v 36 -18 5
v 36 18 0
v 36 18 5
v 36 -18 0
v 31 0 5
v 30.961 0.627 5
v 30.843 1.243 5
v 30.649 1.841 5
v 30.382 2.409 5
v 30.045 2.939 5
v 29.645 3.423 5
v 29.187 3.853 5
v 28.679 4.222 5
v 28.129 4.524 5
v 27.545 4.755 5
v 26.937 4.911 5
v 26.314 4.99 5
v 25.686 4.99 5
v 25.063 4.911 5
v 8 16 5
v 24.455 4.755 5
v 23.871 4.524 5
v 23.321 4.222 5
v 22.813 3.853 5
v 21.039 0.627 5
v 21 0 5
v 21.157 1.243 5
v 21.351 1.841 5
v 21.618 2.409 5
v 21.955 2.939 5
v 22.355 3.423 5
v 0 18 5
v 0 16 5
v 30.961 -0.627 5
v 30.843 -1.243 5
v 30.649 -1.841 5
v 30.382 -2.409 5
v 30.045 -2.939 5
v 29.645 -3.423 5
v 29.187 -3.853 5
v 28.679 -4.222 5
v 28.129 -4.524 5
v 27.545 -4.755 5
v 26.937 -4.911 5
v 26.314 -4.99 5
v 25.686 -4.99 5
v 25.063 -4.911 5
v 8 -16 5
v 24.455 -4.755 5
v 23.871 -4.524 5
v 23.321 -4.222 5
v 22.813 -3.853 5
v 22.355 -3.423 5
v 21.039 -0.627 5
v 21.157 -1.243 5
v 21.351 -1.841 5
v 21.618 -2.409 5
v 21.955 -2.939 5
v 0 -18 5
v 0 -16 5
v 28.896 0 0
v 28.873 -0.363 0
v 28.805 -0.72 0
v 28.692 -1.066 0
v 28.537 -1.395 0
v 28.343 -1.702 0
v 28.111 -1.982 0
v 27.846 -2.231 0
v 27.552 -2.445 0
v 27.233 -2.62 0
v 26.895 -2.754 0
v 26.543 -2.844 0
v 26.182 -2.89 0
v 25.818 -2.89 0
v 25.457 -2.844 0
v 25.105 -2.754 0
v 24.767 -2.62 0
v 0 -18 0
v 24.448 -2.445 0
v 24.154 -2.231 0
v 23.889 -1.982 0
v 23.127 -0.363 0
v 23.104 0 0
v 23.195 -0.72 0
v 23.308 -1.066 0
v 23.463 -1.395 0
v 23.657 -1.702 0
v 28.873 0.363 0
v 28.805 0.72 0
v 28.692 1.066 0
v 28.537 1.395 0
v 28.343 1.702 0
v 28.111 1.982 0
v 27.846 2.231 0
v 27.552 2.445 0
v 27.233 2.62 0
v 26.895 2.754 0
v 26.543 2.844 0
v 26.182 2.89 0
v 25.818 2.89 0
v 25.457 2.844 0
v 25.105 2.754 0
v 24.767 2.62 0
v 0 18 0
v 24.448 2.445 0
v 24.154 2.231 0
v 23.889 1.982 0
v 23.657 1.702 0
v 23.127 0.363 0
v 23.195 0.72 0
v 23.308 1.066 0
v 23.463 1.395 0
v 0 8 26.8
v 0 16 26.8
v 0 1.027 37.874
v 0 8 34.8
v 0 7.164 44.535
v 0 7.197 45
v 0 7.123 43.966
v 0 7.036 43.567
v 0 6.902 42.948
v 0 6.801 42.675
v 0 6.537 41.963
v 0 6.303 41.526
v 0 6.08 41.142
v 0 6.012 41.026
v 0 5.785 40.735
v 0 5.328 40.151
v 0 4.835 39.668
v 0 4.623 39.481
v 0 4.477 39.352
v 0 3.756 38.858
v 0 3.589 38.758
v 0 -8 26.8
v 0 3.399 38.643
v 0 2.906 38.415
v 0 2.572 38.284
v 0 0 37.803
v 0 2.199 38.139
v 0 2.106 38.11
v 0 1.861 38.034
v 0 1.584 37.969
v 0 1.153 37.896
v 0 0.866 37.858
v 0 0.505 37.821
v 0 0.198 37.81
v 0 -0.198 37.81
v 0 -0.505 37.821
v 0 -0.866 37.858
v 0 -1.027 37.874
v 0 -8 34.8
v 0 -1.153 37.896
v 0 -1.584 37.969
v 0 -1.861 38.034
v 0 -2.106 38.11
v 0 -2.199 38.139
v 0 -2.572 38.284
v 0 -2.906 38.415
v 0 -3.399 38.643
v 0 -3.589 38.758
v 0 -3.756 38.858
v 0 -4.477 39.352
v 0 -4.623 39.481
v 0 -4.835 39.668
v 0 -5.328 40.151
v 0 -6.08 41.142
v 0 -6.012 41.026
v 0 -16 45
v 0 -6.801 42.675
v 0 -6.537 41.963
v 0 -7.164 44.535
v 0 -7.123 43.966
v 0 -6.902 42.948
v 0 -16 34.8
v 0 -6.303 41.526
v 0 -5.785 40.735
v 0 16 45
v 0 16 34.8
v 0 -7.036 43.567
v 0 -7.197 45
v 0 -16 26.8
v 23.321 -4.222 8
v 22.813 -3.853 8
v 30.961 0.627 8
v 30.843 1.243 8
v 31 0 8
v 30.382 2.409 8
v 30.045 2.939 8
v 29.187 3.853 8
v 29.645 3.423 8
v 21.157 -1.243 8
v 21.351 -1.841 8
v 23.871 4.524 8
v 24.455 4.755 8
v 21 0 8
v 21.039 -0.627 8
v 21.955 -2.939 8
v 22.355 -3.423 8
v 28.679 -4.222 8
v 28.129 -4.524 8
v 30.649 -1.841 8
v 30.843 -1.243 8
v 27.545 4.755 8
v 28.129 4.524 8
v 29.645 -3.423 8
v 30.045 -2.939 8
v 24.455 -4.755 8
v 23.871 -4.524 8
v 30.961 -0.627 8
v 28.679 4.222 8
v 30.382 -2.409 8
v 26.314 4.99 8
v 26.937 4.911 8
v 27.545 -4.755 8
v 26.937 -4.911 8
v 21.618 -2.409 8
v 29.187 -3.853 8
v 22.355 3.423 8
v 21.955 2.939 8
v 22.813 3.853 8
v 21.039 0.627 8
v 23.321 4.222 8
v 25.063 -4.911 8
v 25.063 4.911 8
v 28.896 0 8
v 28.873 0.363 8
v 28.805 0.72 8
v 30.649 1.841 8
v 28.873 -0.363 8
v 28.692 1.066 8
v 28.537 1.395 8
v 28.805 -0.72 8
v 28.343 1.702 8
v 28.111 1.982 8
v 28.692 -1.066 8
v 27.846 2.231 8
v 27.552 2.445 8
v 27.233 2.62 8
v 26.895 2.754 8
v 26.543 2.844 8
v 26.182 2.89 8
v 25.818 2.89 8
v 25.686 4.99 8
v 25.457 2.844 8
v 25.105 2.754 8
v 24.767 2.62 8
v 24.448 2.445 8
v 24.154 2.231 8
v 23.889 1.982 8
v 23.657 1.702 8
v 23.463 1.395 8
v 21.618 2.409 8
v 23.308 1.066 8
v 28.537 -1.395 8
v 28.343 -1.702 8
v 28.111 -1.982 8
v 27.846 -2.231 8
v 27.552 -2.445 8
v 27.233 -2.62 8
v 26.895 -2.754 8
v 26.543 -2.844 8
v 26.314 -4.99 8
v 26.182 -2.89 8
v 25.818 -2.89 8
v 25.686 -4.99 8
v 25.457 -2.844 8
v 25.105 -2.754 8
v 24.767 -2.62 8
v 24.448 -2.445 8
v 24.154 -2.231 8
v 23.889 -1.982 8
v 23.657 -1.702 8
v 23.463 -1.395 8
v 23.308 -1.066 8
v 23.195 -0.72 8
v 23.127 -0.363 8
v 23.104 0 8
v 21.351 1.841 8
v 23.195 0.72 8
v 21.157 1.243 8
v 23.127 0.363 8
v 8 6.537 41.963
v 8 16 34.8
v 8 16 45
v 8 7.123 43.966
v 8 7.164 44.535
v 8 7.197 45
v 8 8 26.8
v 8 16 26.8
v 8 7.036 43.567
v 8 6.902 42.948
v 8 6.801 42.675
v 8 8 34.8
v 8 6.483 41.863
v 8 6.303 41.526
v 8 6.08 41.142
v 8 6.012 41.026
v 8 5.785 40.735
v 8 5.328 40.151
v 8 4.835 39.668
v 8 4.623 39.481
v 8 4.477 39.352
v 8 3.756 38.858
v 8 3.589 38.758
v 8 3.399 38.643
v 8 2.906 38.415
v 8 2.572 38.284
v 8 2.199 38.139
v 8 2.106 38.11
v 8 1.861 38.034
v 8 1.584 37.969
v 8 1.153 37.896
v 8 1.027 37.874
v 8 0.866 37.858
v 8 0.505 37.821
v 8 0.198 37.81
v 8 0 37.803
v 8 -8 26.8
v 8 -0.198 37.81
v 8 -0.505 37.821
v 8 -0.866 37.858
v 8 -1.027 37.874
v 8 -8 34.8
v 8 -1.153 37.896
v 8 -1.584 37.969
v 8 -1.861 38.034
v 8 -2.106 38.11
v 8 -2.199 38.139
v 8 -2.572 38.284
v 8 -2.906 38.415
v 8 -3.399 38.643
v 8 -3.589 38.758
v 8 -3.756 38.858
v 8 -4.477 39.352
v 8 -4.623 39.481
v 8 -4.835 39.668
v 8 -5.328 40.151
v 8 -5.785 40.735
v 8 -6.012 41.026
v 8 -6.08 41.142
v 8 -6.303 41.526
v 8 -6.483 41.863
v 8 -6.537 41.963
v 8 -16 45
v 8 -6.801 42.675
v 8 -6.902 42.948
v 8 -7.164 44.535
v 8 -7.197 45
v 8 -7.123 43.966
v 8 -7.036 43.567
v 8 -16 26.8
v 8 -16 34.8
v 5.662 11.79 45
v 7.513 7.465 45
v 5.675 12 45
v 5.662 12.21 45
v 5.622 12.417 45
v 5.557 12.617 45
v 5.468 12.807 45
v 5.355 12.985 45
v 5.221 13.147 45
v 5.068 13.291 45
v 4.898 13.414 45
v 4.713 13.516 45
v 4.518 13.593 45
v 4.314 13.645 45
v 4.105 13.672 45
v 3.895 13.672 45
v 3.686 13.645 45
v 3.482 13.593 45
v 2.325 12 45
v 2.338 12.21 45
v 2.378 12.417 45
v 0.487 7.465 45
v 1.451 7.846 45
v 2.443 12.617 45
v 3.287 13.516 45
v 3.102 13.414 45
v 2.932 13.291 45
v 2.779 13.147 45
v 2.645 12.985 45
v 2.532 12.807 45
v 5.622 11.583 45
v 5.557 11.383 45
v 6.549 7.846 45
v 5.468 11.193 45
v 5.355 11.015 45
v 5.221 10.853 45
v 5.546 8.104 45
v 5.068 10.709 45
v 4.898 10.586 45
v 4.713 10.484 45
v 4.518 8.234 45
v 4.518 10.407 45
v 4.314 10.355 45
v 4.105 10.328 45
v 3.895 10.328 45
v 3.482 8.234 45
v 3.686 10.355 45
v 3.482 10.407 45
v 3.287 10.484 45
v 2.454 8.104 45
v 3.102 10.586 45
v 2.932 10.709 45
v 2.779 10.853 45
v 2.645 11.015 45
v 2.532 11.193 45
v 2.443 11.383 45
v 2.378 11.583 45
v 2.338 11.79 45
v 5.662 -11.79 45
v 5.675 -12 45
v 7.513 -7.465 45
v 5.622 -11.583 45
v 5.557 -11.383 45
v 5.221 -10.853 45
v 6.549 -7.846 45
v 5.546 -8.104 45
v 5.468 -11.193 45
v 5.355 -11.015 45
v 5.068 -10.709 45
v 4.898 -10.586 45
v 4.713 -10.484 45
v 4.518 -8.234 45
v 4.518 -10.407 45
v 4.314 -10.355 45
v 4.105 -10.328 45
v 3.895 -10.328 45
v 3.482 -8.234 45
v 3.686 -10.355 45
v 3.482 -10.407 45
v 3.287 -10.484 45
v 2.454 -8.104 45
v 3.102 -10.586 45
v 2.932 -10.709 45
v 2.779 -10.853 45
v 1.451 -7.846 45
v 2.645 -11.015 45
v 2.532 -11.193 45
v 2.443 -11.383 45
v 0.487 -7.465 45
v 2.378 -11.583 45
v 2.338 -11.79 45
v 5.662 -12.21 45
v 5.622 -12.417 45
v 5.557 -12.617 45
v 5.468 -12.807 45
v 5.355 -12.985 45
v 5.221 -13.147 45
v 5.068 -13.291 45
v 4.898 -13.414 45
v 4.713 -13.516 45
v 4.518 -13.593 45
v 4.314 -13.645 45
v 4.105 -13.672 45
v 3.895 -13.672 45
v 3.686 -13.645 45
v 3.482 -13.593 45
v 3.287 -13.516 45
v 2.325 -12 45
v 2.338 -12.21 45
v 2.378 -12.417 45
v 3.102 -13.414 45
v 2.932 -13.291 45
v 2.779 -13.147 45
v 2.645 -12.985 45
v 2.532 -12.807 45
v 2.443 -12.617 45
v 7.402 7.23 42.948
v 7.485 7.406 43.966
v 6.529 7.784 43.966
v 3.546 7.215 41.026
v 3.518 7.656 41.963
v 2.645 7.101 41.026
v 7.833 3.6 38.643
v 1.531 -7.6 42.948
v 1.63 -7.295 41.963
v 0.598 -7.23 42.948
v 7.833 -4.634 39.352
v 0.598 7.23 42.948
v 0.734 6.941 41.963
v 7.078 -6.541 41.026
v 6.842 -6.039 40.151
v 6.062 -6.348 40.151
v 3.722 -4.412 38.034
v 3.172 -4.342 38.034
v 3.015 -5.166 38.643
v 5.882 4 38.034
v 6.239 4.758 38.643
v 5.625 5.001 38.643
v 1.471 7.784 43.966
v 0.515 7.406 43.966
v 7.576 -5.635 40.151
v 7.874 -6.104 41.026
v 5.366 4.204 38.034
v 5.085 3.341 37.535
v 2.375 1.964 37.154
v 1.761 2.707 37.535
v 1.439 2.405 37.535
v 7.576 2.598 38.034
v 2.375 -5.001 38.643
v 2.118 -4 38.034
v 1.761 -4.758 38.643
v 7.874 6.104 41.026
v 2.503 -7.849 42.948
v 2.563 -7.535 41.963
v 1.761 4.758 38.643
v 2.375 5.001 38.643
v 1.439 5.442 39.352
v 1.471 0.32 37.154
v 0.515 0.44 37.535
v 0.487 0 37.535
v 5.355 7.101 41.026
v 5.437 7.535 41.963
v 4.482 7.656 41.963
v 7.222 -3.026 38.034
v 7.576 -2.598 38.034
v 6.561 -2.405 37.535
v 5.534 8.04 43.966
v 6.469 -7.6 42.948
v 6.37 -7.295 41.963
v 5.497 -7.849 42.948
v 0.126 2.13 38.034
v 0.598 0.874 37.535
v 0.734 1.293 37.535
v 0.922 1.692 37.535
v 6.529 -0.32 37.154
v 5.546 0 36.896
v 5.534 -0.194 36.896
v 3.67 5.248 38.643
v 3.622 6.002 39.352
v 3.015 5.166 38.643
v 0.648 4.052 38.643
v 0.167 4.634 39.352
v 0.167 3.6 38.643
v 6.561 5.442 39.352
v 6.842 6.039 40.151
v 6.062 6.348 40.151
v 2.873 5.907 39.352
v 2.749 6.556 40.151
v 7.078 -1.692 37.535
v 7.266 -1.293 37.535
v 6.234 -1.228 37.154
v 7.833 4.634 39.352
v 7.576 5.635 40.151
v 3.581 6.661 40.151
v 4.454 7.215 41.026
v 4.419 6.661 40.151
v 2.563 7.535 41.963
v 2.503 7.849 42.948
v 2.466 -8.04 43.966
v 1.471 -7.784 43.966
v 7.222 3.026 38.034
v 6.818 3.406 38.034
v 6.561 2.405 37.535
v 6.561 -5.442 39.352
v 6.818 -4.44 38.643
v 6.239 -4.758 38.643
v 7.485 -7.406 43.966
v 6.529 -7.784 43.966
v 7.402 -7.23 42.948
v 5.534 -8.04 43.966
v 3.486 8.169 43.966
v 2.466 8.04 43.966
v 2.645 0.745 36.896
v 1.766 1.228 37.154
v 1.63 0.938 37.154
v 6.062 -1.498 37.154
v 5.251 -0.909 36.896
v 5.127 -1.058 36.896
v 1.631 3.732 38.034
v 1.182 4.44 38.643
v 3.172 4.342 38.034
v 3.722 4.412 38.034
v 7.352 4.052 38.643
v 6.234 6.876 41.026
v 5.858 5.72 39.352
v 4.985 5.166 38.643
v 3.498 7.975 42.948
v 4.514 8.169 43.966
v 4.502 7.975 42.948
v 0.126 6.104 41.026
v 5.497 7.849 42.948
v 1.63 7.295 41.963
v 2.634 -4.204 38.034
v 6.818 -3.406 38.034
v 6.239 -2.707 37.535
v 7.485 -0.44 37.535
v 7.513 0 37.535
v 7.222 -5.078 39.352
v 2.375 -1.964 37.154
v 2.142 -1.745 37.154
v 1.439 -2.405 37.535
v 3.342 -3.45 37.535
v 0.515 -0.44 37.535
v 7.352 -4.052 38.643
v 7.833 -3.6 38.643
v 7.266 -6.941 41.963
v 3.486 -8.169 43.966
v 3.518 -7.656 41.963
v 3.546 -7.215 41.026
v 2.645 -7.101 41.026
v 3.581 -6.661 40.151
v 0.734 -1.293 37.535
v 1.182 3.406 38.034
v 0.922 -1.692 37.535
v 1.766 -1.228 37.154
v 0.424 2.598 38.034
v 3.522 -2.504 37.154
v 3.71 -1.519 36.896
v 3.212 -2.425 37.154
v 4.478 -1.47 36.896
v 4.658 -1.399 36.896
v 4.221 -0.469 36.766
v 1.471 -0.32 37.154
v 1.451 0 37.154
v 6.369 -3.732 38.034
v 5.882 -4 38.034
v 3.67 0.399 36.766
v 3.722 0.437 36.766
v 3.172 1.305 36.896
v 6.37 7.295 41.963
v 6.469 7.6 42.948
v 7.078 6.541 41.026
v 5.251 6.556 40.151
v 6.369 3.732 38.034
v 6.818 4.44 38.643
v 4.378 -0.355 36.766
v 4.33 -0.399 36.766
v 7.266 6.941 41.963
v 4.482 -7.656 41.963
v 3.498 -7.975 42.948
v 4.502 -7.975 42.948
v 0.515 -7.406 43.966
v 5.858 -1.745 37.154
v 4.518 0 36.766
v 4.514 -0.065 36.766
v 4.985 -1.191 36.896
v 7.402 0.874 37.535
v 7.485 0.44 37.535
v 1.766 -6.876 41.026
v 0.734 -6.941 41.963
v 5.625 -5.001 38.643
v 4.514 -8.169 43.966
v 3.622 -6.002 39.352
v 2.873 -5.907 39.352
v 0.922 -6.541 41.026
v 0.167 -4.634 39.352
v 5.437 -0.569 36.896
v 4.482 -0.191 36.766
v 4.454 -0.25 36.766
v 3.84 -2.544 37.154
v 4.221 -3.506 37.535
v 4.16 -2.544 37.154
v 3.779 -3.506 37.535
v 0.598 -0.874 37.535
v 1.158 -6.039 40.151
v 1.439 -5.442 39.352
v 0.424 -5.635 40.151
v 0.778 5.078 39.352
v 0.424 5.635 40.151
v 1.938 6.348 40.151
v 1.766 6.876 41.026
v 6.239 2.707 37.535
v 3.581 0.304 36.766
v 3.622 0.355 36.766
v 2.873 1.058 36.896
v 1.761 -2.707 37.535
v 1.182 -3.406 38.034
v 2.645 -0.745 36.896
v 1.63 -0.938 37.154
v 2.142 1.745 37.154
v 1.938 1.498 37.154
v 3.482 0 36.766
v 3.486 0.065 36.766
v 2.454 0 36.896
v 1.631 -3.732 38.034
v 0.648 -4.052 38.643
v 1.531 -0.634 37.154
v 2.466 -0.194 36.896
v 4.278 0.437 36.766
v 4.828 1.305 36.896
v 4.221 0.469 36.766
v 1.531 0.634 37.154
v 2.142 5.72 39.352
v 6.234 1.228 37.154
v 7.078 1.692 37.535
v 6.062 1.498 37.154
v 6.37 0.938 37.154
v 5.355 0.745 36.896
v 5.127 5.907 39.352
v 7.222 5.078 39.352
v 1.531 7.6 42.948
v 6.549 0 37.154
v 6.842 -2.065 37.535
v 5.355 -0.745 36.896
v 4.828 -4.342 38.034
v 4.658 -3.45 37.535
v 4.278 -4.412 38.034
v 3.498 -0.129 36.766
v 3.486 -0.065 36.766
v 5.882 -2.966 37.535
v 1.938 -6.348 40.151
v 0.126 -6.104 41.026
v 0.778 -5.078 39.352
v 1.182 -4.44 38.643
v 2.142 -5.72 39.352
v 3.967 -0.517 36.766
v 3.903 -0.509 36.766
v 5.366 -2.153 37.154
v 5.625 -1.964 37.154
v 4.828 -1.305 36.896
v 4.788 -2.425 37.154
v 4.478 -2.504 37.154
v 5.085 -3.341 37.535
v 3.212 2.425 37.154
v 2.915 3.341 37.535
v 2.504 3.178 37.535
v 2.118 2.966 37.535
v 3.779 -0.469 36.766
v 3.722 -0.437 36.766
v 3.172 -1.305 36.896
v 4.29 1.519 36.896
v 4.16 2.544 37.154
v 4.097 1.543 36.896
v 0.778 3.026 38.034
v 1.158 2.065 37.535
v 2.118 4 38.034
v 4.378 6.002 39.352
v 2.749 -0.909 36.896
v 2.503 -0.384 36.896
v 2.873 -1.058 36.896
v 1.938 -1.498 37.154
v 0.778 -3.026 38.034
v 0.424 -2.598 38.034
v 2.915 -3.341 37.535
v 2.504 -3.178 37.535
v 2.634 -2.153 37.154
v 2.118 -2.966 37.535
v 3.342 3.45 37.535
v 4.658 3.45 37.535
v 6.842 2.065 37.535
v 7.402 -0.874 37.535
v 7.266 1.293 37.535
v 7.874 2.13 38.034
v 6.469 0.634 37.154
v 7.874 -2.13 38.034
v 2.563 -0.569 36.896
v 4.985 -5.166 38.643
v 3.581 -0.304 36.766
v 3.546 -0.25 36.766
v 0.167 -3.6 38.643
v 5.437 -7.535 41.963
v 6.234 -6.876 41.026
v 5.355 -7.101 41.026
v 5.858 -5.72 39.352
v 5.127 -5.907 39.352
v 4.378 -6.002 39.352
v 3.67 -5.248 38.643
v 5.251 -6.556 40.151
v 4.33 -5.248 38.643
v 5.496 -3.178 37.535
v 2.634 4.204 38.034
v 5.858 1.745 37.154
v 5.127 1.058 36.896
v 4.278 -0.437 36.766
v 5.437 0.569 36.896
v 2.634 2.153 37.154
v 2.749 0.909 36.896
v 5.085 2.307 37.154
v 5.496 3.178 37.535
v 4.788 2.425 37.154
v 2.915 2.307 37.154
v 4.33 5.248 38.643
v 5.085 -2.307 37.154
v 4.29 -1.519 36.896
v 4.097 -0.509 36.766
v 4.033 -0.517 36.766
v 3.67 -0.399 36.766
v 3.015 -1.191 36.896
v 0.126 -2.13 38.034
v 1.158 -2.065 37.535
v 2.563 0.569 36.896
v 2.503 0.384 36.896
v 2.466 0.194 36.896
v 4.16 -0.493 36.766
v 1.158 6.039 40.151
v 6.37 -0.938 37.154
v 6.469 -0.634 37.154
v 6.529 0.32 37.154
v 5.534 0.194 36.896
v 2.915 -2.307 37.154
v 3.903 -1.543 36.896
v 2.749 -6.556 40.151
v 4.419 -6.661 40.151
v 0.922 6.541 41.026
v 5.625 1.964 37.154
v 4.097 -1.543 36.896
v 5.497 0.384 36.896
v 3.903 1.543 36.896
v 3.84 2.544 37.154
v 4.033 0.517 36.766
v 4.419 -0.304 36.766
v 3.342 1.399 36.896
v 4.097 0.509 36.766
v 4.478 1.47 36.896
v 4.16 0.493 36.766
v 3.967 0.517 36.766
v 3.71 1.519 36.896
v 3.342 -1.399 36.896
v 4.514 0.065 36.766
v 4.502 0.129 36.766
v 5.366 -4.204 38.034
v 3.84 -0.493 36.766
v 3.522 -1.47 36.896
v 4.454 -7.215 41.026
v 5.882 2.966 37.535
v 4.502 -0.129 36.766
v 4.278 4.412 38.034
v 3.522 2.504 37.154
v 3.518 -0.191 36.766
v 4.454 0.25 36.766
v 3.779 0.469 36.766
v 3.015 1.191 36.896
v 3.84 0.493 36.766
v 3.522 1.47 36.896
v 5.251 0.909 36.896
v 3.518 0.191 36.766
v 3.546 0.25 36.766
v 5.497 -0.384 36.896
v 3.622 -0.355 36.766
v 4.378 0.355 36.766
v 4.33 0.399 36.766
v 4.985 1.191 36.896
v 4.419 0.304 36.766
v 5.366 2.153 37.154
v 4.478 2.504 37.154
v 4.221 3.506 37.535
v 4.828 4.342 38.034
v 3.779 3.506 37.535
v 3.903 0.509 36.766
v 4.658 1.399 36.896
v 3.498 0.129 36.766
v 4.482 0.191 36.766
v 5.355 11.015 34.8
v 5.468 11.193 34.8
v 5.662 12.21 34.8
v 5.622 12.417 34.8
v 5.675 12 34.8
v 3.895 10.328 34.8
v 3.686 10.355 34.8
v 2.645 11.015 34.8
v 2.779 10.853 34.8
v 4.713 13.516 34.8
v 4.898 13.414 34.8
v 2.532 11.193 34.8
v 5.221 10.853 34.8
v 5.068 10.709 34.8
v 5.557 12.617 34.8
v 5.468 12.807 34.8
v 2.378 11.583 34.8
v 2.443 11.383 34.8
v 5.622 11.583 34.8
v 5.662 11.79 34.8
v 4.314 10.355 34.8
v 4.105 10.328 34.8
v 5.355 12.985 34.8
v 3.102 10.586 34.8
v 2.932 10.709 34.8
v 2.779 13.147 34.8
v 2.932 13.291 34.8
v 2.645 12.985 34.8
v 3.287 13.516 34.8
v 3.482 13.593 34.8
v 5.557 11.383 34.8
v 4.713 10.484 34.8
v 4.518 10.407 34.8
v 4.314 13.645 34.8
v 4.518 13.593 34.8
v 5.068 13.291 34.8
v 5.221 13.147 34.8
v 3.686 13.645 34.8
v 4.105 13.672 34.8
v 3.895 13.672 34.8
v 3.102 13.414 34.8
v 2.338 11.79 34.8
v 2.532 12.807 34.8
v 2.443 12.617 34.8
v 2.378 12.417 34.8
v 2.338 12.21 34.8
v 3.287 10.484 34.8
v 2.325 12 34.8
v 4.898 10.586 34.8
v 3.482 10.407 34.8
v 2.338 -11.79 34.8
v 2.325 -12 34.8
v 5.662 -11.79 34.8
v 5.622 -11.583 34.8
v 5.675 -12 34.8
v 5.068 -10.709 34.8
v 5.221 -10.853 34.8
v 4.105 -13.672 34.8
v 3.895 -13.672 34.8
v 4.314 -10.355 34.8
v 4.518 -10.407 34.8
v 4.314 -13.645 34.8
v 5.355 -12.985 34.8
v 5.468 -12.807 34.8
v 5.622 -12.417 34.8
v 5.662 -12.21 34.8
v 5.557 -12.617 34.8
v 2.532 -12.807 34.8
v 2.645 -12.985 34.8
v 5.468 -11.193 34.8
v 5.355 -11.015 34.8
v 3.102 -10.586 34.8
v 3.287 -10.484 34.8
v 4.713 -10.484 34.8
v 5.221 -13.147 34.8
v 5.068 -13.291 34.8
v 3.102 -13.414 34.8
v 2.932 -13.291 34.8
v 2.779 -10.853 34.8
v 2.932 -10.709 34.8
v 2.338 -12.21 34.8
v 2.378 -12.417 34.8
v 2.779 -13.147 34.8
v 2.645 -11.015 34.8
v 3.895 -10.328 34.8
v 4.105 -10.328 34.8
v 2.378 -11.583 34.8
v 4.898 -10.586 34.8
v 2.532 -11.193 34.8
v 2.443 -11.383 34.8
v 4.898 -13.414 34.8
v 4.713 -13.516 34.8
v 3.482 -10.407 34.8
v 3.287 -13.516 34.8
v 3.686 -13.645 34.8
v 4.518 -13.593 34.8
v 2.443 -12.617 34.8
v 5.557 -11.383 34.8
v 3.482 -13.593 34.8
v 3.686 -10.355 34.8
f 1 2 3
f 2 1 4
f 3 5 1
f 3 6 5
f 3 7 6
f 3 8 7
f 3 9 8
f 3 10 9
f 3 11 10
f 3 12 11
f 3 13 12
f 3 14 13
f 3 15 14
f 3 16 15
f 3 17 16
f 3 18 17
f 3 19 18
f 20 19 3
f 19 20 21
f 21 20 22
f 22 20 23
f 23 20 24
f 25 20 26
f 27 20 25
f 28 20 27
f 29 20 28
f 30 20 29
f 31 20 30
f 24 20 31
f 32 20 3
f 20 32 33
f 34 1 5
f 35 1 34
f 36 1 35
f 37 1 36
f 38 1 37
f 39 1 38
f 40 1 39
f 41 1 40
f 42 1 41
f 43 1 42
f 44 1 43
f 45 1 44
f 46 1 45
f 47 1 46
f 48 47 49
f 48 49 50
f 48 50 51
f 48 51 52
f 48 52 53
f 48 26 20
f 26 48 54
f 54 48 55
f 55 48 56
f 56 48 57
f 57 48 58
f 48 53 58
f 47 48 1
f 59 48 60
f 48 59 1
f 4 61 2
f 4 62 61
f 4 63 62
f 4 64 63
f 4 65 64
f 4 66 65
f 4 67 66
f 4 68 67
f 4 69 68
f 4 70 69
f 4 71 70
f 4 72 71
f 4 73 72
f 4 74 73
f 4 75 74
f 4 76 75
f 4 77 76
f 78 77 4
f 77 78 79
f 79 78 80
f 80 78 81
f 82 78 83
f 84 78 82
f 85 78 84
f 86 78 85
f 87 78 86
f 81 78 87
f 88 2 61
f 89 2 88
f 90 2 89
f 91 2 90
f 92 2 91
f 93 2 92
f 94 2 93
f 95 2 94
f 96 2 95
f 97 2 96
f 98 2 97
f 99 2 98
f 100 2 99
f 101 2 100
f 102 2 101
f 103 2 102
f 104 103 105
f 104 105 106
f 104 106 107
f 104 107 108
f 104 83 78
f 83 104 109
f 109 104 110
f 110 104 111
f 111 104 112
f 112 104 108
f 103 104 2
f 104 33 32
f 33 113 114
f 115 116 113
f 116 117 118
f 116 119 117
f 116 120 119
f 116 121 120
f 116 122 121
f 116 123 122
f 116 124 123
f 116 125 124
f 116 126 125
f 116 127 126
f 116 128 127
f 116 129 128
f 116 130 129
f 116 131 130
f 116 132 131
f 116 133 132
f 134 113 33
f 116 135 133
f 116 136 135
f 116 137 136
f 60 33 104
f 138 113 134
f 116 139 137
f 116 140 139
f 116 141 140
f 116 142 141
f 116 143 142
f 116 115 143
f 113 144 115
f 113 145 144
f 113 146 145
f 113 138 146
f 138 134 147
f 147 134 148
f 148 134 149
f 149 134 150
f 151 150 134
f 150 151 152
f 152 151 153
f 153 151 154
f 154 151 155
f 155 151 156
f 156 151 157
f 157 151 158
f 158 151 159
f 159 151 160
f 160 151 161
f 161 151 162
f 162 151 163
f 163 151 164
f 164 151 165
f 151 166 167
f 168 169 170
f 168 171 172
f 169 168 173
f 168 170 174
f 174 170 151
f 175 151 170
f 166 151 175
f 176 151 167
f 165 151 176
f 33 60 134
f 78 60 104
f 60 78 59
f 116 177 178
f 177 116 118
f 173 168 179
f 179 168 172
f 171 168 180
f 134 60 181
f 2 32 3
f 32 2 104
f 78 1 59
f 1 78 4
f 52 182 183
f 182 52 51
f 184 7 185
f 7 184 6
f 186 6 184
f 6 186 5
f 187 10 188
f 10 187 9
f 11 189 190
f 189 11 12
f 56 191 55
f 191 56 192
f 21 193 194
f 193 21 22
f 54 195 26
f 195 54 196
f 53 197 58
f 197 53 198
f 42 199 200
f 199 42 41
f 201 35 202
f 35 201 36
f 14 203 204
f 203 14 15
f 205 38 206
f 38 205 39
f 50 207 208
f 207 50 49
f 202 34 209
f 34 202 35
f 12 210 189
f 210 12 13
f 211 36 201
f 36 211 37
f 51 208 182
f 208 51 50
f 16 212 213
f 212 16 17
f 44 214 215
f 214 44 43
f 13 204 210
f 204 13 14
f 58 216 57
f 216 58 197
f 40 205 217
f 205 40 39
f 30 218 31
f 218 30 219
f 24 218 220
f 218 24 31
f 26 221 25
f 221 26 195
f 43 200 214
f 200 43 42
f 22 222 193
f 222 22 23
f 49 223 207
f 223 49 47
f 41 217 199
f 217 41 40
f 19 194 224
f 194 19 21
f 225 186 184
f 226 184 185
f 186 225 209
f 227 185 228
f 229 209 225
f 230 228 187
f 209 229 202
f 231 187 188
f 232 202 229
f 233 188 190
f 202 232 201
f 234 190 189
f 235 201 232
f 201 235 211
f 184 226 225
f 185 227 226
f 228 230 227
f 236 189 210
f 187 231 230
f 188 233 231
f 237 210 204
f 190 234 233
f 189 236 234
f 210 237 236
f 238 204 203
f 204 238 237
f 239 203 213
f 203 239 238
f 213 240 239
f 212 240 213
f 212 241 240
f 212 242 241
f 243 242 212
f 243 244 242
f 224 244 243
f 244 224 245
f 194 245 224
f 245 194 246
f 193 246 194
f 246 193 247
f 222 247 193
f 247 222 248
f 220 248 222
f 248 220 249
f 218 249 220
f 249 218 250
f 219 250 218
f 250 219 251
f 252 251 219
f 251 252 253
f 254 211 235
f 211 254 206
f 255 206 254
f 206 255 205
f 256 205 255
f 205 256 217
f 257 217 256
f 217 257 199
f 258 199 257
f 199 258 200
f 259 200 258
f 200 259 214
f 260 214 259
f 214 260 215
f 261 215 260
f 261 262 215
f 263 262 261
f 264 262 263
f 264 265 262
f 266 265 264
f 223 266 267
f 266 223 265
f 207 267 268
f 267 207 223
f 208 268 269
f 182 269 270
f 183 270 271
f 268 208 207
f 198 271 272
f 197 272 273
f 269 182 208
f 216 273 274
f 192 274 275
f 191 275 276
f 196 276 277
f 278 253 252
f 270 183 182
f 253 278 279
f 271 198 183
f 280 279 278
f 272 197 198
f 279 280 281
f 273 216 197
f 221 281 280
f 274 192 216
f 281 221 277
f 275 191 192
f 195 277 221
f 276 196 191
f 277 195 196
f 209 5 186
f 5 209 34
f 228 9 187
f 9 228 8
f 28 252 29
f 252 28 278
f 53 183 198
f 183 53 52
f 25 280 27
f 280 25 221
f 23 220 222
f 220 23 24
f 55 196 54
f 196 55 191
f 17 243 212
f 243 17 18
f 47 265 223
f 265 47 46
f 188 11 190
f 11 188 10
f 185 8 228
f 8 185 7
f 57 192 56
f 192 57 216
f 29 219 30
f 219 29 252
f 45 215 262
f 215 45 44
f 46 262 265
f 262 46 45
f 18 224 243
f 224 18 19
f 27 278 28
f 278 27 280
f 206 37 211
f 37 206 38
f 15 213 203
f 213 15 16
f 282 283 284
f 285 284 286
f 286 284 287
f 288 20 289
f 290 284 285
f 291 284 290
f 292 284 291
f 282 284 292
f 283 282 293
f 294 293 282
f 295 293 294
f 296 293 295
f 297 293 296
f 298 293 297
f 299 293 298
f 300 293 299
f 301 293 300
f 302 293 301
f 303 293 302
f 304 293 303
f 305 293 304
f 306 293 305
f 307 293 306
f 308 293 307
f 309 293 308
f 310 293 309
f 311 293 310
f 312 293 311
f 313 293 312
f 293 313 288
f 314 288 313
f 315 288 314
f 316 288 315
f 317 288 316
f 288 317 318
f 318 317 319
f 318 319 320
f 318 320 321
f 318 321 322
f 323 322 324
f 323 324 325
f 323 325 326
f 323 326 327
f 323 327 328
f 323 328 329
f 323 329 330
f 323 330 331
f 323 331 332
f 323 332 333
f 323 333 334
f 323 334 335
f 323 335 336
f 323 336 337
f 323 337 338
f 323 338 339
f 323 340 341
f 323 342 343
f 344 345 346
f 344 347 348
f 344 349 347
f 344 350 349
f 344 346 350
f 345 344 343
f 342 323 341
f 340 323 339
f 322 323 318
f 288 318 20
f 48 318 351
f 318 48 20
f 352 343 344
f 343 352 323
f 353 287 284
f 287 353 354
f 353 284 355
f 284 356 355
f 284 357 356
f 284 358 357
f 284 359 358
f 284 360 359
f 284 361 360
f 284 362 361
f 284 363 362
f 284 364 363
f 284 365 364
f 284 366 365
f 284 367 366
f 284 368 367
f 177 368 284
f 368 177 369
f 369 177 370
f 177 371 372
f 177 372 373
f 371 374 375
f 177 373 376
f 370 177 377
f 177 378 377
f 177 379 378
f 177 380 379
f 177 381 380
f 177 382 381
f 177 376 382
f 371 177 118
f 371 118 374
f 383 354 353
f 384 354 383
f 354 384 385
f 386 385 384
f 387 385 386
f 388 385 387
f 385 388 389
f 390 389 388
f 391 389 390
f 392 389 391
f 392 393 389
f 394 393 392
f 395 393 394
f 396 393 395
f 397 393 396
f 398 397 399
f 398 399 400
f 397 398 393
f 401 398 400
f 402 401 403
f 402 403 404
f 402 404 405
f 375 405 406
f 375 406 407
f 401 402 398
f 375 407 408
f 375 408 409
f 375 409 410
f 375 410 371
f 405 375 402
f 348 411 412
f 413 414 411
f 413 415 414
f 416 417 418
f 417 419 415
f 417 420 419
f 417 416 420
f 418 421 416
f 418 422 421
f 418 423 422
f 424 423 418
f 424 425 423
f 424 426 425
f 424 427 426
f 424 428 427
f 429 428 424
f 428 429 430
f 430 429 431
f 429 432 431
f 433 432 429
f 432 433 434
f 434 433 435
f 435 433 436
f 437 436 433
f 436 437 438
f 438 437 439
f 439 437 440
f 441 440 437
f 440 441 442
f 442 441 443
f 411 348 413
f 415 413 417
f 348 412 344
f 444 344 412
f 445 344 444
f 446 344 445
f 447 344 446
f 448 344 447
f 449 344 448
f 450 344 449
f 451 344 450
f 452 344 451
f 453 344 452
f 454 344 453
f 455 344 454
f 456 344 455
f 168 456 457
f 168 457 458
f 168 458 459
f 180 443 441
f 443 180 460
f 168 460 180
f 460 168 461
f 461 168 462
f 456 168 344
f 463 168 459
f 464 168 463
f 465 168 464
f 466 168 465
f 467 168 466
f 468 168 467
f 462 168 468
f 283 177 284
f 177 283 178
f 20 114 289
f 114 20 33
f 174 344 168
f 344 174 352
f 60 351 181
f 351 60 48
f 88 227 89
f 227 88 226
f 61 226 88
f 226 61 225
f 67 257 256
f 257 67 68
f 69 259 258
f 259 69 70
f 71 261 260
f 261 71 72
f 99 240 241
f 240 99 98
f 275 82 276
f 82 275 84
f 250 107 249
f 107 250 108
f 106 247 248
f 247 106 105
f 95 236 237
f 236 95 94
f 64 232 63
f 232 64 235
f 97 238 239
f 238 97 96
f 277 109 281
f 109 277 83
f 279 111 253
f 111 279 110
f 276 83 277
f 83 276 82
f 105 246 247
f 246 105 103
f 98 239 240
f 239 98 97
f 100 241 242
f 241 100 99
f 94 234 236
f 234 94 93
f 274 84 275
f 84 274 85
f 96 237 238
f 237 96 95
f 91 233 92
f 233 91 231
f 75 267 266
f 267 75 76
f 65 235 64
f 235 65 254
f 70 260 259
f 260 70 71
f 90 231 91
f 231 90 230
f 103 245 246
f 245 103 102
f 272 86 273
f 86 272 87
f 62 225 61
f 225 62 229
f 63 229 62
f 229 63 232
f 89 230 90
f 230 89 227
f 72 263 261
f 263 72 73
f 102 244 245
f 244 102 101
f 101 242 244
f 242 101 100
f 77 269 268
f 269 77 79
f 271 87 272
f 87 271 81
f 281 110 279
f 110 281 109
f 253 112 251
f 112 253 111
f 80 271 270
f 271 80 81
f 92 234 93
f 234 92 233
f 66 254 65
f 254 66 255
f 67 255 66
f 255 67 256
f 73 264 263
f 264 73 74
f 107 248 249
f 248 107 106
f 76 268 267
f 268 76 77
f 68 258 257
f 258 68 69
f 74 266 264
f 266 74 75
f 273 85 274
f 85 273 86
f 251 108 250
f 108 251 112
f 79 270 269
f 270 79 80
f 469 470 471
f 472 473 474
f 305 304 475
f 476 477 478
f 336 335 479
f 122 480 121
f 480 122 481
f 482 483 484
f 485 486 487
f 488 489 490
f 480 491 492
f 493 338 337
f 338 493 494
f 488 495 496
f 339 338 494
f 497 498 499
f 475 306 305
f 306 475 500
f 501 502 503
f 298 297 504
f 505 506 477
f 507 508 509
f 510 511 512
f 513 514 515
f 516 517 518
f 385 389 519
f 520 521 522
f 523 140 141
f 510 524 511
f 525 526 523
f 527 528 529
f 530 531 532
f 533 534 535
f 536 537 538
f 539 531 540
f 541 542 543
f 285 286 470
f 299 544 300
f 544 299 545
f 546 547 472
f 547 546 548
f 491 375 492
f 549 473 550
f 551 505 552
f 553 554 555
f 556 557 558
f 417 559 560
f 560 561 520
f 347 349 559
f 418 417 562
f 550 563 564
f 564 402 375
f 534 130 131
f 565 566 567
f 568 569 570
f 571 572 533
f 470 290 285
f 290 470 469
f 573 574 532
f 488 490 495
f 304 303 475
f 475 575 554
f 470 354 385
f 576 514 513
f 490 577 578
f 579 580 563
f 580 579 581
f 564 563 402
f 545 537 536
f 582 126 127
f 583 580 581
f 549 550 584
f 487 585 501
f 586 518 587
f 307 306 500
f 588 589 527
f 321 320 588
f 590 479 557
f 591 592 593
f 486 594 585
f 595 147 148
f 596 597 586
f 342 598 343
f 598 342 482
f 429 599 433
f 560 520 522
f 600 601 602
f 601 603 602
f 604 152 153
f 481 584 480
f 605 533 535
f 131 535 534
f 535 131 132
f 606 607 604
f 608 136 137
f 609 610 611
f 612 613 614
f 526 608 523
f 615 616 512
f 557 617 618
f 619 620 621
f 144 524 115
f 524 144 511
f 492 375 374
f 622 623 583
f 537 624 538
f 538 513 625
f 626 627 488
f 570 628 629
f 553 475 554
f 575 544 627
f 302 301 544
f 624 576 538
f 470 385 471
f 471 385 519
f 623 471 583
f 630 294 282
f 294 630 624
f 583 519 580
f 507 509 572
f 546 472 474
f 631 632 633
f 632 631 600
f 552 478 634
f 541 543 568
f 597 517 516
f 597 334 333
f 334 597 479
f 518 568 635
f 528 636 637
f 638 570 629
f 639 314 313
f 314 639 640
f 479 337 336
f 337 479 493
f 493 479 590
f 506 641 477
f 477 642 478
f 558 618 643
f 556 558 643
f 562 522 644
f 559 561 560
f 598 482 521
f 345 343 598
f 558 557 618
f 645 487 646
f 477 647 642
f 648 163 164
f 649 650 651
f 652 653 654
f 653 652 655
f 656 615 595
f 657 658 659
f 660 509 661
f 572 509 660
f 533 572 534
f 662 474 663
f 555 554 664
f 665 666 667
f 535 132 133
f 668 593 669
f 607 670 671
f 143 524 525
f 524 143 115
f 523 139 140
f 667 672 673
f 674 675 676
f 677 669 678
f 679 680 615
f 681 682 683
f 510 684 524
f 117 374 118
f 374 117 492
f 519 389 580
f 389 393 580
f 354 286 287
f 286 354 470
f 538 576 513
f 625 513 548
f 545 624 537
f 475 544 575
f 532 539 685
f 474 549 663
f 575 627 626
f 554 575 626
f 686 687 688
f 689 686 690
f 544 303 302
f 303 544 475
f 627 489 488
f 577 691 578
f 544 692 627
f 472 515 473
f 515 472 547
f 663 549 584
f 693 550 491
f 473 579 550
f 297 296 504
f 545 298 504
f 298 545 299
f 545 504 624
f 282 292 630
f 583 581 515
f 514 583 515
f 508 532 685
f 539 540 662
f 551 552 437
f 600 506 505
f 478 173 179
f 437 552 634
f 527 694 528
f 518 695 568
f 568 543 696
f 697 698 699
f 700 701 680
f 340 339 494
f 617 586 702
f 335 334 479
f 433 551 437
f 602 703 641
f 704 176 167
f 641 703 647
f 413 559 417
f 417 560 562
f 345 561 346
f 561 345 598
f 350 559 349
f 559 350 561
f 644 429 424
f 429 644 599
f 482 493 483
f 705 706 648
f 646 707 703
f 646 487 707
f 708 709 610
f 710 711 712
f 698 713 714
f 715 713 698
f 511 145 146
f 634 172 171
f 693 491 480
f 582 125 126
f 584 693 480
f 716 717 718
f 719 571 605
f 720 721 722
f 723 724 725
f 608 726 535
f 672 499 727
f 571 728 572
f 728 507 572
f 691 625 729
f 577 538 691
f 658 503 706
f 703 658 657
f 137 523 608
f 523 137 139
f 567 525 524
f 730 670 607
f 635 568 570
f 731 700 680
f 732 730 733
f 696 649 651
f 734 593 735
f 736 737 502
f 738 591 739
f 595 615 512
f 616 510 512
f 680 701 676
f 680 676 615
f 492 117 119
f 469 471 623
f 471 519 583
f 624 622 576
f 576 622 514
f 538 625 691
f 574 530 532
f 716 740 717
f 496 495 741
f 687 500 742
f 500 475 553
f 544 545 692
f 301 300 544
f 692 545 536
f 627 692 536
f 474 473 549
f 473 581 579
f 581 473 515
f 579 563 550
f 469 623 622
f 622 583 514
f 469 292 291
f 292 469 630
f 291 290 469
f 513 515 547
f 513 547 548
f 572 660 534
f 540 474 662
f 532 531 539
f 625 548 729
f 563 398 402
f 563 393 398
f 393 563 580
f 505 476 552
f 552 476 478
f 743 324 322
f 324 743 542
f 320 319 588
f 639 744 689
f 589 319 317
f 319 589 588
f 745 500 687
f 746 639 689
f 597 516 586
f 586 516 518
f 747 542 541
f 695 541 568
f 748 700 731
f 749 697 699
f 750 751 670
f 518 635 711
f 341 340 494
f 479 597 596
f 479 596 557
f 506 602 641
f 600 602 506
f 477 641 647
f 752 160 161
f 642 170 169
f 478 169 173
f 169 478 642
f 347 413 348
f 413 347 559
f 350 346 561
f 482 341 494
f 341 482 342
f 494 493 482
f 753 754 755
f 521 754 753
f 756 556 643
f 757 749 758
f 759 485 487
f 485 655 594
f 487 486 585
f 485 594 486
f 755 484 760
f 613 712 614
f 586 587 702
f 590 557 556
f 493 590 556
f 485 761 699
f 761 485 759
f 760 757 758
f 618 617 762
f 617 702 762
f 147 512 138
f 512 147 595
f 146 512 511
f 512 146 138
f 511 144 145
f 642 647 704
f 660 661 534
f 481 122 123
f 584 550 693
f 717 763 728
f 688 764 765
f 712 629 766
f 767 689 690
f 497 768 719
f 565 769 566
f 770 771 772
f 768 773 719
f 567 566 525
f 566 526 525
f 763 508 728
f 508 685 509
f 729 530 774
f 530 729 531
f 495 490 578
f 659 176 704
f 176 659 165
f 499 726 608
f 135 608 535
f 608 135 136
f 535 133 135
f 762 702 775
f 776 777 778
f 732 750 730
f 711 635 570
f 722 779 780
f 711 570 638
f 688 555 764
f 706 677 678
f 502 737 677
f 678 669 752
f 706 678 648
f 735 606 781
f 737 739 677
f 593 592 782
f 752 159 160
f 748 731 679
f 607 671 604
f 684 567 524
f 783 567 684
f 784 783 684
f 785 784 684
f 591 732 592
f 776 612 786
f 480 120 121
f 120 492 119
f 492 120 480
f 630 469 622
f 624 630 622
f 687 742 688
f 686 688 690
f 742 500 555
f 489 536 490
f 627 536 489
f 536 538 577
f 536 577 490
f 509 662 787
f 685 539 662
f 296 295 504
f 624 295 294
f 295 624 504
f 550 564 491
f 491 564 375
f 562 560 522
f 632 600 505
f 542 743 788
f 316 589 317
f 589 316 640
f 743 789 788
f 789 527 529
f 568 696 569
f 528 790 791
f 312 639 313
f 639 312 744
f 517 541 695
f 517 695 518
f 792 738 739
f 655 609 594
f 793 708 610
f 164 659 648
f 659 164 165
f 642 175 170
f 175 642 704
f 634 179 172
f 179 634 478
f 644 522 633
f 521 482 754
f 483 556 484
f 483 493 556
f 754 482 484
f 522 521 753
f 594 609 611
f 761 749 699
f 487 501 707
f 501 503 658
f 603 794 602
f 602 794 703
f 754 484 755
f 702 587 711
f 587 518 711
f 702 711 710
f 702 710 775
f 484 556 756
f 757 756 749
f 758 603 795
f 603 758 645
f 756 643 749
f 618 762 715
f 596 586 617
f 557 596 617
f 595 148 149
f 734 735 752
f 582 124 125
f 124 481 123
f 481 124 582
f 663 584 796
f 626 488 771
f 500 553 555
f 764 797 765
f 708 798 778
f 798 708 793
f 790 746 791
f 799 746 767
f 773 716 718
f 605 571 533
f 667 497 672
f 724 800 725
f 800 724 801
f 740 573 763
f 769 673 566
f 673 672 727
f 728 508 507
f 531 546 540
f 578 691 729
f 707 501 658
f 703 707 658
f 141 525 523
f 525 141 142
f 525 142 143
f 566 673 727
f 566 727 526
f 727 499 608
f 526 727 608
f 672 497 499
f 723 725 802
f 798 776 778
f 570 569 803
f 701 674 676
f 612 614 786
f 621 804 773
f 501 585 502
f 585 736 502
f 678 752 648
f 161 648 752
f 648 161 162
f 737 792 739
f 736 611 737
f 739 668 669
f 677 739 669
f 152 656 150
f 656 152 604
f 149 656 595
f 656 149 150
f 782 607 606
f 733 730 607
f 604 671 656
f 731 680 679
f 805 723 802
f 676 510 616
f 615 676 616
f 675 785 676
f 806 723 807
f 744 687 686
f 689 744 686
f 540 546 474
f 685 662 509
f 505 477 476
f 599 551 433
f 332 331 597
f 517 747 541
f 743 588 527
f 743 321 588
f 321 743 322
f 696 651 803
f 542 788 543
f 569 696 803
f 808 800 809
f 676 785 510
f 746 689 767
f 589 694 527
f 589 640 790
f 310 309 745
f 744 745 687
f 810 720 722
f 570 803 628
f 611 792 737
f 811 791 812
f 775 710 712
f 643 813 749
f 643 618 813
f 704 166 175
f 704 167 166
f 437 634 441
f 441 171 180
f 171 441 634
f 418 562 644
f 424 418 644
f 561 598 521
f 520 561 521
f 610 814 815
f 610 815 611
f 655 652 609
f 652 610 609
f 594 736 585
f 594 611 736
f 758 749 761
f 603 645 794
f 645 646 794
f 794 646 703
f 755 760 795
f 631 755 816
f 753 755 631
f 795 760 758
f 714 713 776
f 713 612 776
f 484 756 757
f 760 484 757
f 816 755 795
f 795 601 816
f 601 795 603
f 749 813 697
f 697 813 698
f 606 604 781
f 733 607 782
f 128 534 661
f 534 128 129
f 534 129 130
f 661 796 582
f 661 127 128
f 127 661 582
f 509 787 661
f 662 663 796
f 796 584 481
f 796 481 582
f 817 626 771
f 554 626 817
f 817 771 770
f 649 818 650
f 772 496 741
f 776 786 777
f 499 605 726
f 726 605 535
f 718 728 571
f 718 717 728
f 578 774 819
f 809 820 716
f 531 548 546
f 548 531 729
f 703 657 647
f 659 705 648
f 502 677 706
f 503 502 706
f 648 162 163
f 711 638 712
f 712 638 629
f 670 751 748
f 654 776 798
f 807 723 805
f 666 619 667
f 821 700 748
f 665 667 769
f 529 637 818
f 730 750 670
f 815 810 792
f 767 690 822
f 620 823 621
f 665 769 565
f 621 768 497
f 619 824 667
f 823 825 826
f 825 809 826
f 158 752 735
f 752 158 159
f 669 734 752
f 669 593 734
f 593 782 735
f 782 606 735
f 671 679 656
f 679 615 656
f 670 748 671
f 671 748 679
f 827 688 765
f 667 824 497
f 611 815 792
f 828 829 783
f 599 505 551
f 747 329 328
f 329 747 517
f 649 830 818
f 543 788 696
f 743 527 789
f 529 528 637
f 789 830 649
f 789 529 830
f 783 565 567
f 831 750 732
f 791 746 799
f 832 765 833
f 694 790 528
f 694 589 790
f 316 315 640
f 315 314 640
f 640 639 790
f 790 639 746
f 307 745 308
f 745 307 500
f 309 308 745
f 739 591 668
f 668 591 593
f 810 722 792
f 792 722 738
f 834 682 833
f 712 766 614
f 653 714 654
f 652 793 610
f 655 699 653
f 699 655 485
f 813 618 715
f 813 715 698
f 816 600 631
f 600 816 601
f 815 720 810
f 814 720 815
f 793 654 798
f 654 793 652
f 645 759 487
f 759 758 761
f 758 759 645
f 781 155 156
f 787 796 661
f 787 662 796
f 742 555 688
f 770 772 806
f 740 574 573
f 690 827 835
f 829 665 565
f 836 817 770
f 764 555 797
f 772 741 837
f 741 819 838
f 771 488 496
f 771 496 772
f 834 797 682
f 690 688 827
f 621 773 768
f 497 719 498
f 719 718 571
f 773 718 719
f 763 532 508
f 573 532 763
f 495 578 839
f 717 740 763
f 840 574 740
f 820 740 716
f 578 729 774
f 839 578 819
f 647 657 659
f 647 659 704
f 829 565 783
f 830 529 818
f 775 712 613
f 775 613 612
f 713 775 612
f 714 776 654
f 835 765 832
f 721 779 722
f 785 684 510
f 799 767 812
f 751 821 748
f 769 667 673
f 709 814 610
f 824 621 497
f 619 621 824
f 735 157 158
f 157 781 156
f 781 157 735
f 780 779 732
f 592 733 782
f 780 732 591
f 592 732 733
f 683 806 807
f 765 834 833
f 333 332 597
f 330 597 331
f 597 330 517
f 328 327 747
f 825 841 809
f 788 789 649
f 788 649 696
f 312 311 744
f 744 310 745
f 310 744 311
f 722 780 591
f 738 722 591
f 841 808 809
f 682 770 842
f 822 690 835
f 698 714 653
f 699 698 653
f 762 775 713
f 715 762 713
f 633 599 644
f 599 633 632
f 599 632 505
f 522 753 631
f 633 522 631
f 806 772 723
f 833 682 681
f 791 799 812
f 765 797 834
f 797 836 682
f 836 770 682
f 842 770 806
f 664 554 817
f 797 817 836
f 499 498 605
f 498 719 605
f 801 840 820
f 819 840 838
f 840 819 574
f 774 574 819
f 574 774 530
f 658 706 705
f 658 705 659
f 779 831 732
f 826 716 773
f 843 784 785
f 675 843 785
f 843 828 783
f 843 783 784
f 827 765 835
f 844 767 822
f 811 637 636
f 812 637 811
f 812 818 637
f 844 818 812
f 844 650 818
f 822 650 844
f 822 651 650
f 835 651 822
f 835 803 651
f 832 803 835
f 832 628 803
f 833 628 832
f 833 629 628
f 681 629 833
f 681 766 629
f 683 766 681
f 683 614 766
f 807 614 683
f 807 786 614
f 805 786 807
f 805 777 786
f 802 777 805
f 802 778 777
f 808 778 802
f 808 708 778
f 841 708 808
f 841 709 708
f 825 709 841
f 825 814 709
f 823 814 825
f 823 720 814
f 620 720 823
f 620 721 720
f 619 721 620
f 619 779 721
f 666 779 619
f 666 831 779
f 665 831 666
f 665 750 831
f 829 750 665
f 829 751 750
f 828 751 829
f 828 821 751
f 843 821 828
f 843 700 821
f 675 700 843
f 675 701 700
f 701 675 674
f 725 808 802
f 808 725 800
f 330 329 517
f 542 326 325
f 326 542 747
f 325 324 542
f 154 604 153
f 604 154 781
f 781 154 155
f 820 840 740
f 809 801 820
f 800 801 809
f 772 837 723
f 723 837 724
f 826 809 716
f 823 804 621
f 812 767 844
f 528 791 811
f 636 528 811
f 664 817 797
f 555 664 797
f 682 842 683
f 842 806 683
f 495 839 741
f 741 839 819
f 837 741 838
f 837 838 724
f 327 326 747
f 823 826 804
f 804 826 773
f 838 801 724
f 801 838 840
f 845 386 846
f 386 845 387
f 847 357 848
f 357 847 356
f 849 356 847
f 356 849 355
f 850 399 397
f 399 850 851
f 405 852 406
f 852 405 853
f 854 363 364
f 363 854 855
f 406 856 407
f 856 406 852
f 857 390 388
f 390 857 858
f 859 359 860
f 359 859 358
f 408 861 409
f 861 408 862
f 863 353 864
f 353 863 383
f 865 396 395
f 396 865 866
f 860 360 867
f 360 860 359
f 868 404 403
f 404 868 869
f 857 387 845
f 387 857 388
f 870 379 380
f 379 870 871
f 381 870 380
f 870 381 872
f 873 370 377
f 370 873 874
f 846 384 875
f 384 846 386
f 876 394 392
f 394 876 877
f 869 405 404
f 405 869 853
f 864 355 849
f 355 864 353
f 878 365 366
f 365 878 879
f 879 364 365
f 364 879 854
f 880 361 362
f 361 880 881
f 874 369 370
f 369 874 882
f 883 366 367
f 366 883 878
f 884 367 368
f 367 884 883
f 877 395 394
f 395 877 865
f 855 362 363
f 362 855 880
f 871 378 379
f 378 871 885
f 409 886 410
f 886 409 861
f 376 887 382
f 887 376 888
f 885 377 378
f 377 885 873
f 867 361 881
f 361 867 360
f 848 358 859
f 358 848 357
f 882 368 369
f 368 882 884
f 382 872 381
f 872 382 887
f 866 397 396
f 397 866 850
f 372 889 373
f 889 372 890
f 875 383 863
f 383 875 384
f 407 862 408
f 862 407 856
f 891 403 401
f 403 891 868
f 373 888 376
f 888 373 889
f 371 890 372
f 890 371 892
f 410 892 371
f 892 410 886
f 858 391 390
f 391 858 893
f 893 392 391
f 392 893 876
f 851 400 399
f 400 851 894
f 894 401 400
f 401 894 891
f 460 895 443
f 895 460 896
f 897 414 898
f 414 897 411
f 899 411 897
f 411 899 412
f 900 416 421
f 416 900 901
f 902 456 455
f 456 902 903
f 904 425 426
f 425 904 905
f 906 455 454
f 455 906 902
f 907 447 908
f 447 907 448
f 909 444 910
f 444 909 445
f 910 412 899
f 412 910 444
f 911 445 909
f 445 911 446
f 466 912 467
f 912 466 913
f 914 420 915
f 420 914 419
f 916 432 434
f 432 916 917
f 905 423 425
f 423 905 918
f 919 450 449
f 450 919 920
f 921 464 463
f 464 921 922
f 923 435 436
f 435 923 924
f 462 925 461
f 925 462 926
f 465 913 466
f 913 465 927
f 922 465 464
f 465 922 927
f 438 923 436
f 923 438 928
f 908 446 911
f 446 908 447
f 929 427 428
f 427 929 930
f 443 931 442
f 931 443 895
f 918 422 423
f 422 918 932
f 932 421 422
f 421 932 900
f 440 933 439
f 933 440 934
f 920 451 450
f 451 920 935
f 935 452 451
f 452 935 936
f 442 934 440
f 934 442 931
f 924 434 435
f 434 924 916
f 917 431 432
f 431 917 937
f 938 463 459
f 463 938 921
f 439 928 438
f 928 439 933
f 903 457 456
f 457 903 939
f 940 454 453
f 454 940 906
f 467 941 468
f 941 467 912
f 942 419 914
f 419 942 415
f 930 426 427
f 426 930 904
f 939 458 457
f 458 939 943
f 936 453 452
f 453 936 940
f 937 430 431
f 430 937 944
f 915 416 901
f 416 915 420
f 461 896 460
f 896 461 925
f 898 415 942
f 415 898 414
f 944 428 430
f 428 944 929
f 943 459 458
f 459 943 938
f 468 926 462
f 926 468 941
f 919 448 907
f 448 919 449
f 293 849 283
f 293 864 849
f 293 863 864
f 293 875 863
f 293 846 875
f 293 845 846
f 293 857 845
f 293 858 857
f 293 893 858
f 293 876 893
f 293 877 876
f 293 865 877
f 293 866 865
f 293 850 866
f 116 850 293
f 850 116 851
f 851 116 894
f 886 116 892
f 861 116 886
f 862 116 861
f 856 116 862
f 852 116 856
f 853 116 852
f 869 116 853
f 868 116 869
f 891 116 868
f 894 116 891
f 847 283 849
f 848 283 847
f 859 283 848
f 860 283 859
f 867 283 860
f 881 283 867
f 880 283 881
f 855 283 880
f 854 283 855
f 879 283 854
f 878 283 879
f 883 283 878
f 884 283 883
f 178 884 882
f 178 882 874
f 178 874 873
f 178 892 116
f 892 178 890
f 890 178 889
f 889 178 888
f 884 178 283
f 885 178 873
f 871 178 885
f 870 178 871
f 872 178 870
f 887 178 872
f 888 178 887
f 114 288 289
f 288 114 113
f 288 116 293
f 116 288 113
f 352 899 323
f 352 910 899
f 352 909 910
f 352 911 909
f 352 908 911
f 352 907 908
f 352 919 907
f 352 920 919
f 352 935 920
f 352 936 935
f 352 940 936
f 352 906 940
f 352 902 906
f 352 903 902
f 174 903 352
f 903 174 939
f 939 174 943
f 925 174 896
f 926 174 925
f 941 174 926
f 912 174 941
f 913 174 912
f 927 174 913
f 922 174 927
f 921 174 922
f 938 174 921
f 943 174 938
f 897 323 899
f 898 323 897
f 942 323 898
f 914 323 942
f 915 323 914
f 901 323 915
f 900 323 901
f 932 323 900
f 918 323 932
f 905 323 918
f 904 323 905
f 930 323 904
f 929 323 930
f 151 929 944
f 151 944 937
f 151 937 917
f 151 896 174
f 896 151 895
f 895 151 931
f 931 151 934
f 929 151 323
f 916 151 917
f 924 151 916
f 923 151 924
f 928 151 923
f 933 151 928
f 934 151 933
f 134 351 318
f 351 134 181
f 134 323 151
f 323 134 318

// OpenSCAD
// base plate
// 20211206 - raise

plate_width = 36;
plate_depth = 36;
plate_thick = 5;

sphere_dia = 16.0;

arm_depth = 8;
arm_width = sphere_dia + 2 * 8;
arm_height = 32 + 8;
// 1/4" camera mount
pilot_dia = 0.228 * 25.4;    // about 5mm

m4_pilot = 3.35;
m4_dia = 4.2;

// nut height
nut_from_top = sphere_dia/2 + 6;
nut_width = 8;
nut_thickness = 8;


$fn = 50;

difference () {
    union () {
        //plate
        translate([0,-plate_width/2,0])
        cube([plate_depth, plate_width, plate_thick], center = false);

        // 1/4 mount hole
        translate([plate_depth/2 + 8,0,0])
        cylinder(r = 10/2, h = 8, center = false);

        // arm height is on TOP of plate
        translate([0,-arm_width/2,plate_thick])
        cube([arm_depth, arm_width, arm_height], center = false);
    }
    // holes
    union () {
        // 1/4 mount hole
        translate([plate_depth/2 + 8,0,0])
        cylinder(r = pilot_dia/2, h = 8, center = false);
        
        // mounting sphere
        translate([sphere_dia/4,0,plate_thick + arm_height])
        sphere(r = (sphere_dia + 0.5)/2);
        
        // cap screw holes
        translate([arm_depth/2, 
            arm_width/2 - 4,
            (arm_height + plate_thick) - nut_from_top])
        cylinder(r = m4_pilot/2, h = nut_from_top, center = false);
        
        translate([arm_depth/2,
            -(arm_width/2 - 4),
            (arm_height + plate_thick) - nut_from_top])
        cylinder(r = m4_pilot/2, h = nut_from_top, center = false);
        

        // nut cut out
        translate([0, 
            arm_width/2 - 4.0  - nut_width/2,
            (arm_height + plate_thick) - (nut_from_top + 4) - 0.2])
        cube([arm_depth, nut_width, nut_thickness], center = false);
        
        translate([0, 
            -(arm_width/2 - 4.0)  - nut_width/2,
            (arm_height + plate_thick) - (nut_from_top + 4) - 0.2])
        cube([arm_depth, nut_width, nut_thickness], center = false);
    }
}
